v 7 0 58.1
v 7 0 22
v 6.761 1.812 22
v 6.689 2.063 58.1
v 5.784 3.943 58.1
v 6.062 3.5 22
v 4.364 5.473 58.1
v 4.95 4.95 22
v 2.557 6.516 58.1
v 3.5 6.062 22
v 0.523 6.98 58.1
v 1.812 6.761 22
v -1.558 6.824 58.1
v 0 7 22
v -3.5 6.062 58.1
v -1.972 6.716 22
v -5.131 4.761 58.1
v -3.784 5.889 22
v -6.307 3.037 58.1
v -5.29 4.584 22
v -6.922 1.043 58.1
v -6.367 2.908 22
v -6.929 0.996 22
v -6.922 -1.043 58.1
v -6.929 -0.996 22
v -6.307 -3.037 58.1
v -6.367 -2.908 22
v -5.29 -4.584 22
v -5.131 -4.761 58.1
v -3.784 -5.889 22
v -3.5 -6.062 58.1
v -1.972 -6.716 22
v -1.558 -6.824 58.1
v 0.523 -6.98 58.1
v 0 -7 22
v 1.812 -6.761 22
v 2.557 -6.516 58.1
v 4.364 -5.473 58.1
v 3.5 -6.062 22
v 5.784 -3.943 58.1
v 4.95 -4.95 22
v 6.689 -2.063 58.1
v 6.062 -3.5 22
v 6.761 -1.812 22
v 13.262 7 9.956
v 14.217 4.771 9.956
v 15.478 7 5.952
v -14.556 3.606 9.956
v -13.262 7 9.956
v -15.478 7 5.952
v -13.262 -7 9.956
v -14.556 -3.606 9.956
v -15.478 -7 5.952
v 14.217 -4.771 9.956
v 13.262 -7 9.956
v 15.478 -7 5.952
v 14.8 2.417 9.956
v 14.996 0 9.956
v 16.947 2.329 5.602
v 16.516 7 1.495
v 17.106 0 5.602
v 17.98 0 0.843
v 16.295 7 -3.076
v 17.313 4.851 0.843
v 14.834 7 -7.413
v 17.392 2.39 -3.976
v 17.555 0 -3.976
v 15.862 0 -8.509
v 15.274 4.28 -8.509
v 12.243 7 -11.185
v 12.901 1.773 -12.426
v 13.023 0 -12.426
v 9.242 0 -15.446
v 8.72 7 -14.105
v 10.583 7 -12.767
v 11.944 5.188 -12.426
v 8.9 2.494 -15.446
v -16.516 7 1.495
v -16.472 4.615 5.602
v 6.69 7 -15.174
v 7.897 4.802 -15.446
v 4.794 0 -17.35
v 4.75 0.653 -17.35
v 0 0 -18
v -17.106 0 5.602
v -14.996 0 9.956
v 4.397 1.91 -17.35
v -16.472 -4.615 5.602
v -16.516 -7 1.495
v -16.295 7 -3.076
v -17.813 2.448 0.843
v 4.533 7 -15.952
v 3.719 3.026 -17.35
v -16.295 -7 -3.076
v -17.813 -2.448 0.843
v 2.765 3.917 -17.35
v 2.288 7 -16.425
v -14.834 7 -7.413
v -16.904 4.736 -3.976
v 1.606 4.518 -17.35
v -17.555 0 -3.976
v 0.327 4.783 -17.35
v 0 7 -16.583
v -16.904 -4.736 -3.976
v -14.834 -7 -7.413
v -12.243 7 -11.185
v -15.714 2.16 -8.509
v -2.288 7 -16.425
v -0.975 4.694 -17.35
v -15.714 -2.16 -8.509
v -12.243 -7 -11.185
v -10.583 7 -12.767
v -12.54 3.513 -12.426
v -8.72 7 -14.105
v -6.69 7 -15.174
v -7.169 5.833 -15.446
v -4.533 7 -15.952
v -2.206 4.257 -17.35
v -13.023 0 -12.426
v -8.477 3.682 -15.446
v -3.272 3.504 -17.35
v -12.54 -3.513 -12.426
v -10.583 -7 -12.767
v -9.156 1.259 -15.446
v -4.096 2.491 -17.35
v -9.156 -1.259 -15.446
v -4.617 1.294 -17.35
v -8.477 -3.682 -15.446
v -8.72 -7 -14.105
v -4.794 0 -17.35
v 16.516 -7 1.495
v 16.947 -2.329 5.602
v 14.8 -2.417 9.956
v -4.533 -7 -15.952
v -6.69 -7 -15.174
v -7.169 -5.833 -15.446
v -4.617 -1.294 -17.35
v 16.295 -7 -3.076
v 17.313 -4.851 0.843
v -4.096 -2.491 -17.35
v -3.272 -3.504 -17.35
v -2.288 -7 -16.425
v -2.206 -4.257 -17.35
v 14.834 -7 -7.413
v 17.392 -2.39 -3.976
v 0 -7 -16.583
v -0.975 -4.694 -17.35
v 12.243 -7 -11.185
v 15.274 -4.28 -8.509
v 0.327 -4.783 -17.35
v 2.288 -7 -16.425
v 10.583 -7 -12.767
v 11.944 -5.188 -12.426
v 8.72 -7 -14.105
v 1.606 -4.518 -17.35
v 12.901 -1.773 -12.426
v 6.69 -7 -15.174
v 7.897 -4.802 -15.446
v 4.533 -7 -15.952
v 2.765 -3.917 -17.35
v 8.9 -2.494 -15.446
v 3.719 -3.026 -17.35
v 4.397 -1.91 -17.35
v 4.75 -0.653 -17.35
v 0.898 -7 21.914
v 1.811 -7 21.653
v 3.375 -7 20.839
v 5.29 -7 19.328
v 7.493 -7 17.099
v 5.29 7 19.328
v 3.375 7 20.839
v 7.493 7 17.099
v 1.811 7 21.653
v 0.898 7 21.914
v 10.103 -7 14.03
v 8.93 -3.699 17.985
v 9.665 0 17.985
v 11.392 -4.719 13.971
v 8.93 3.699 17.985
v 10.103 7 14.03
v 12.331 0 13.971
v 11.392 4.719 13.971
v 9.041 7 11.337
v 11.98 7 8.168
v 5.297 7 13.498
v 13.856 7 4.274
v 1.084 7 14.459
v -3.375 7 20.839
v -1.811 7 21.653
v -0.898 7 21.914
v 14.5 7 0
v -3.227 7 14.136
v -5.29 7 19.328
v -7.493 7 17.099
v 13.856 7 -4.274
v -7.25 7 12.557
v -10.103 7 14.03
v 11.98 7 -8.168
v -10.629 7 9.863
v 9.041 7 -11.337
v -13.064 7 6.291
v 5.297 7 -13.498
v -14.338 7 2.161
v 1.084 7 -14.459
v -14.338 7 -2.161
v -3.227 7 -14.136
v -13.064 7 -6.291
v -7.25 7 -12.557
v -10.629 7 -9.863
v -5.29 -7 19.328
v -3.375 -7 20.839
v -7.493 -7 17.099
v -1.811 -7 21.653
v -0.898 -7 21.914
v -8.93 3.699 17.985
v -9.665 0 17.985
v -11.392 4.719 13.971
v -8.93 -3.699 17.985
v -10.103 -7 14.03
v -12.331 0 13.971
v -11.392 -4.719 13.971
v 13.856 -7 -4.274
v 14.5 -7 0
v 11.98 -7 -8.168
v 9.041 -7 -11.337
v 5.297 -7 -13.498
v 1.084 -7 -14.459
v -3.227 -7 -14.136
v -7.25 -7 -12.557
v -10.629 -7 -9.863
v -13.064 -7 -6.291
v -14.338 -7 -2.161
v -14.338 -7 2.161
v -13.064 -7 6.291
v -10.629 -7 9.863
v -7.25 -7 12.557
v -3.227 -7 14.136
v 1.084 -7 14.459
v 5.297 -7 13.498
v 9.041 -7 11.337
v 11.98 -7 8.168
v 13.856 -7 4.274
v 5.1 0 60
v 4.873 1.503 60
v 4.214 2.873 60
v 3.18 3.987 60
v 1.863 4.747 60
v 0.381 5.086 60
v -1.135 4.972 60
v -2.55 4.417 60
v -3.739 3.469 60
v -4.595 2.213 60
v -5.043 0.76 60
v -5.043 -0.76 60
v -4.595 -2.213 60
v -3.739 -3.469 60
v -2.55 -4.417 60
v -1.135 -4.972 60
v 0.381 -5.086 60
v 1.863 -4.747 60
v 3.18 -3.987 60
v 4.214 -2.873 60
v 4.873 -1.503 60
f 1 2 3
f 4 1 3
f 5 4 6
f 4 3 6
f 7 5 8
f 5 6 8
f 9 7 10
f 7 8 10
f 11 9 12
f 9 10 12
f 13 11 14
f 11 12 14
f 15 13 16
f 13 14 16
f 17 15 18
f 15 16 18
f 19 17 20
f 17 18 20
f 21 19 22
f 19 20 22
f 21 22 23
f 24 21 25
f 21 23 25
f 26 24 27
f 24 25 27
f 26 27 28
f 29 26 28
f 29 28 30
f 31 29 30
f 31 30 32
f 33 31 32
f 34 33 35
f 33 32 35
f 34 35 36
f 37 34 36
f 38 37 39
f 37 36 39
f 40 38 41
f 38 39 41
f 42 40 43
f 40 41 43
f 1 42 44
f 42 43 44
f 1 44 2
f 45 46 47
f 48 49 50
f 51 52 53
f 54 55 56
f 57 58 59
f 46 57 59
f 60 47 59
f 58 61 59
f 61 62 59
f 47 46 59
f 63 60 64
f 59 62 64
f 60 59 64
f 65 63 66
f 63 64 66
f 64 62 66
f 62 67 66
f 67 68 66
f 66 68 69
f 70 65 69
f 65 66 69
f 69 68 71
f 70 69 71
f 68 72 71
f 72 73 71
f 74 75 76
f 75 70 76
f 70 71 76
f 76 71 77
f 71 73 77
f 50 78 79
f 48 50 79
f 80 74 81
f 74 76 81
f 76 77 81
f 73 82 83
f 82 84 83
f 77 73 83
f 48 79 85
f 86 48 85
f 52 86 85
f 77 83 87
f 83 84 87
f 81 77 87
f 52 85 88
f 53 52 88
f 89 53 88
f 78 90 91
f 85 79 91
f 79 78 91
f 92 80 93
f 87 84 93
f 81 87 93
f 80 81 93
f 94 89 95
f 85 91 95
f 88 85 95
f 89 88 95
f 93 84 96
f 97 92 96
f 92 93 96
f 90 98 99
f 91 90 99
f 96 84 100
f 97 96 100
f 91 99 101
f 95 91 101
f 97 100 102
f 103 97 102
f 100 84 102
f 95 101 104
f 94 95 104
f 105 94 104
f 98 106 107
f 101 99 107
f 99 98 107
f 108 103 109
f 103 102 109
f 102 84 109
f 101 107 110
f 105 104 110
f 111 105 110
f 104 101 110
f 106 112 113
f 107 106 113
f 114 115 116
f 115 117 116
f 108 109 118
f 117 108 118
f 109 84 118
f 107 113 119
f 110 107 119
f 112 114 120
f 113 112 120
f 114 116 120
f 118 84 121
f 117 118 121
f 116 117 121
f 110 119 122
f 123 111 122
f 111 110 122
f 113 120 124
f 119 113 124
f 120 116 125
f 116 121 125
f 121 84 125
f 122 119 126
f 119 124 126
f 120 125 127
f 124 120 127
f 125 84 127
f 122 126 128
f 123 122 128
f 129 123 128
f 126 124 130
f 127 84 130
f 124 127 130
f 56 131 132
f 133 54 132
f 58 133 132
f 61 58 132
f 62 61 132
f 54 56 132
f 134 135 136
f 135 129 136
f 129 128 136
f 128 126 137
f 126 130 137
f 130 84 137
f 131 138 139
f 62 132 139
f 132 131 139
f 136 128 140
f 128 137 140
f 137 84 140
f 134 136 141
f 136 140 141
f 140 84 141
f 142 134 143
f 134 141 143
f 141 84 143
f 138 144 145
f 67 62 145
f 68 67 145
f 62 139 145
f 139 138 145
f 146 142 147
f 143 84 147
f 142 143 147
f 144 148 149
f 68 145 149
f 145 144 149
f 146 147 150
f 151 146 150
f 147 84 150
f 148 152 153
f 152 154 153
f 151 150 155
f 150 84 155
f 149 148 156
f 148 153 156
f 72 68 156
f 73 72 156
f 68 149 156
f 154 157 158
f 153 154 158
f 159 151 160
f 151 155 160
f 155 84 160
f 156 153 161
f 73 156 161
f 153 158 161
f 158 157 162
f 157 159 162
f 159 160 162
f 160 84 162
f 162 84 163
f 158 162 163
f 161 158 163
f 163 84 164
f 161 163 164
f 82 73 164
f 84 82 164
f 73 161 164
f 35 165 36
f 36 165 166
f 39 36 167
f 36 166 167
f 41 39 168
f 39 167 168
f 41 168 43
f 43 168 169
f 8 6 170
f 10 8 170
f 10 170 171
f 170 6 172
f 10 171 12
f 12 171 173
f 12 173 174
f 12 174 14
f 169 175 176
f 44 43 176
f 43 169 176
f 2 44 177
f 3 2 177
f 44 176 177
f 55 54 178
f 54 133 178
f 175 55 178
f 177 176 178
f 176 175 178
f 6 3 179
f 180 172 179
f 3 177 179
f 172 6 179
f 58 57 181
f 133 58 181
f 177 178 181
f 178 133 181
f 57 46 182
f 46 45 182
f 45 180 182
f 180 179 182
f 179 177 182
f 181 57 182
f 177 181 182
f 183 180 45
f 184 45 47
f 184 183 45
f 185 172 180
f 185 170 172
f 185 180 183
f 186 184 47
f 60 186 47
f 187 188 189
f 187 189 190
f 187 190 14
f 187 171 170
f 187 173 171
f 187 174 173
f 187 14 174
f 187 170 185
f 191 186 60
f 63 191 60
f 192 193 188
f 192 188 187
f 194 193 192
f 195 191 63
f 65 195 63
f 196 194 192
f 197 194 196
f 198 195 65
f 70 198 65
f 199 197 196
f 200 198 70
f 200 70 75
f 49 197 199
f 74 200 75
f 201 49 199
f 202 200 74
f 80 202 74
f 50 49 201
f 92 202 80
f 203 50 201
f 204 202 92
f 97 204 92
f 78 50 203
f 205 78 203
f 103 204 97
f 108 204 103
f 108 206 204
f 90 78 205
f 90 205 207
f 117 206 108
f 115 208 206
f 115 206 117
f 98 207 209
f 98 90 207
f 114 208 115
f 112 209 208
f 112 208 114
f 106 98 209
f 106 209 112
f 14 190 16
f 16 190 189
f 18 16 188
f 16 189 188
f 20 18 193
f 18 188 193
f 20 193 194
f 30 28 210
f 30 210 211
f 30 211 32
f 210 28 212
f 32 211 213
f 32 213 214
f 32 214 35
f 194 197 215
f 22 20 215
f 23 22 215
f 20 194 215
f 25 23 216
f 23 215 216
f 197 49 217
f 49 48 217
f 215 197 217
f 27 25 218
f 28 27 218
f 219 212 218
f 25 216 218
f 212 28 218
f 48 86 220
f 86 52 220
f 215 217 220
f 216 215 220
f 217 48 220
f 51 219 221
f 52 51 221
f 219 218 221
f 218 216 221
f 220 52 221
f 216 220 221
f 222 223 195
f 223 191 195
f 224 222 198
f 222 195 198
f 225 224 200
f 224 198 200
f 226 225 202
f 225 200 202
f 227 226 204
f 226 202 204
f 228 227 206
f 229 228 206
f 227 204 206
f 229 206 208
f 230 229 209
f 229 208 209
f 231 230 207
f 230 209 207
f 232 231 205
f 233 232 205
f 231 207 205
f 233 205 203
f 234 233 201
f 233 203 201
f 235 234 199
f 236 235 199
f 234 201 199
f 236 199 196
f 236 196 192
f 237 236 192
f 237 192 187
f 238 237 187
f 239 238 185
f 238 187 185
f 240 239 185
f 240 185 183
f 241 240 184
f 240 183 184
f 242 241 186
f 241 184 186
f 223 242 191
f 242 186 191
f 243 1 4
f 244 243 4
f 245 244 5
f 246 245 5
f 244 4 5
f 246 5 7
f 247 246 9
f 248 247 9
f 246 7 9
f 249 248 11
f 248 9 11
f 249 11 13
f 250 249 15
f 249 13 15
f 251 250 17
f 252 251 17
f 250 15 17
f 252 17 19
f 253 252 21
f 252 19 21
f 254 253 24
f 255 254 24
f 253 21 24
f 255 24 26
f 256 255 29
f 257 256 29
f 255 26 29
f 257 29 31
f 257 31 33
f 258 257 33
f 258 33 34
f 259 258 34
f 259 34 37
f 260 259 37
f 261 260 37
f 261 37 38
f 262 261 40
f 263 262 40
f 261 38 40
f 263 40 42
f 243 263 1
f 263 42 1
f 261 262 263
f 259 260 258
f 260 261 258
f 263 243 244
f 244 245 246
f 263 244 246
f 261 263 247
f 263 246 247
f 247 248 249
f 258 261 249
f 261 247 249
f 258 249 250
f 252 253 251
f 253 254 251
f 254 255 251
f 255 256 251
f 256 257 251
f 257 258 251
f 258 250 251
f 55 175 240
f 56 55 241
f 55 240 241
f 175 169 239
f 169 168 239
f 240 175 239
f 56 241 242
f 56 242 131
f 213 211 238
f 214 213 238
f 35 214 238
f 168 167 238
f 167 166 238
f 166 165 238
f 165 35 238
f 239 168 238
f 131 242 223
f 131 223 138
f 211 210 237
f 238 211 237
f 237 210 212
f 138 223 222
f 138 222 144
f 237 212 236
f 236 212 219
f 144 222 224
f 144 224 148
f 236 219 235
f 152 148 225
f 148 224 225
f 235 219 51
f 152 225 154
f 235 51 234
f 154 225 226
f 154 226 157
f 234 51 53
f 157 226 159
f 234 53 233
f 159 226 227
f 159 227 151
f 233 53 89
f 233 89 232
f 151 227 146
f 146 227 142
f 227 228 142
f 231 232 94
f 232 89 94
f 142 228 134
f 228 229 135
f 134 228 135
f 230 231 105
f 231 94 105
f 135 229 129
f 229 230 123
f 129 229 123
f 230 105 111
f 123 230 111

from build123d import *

# Parameters (mm, degrees)
SZKIC1_W                        = 7
SZKIC1_H                        = 38
WYTNIJ_WYCI_GNI_CIE1_DEPTH      = 19
WYTNIJ_WYCI_GNI_CIE1_DEPTH_BACK = 19
SZKIC3_R                        = 14.5
WYTNIJ_WYCI_GNI_CIE2_DEPTH      = 8
WYTNIJ_WYCI_GNI_CIE2_DEPTH_BACK = 8
SFAZOWANIE1_SIZE                = 1.9


with BuildPart() as part:
    # Szkic1 → Obrót1 (revolve)
    with BuildSketch(Plane(origin=(0, 0, 0), x_dir=(1, 0, 0), z_dir=(0, 1, 0))):
        with BuildLine():
            Line((0, 18), (0, -22))
            Line((0, -22), (7, -22))
            Line((7, -22), (14.996070523, -9.955795743))
            ThreePointArc((14.996070523, -9.955795743), (15.861972188, 8.508691927), (0, 18))
        make_face()
        with Locations((3.5, -41)):
            Rectangle(SZKIC1_W, SZKIC1_H)
    revolve(axis=Axis((0, 0, -26.043516498), (0, 0, 1)))

    # Szkic2 → Wytnij-wyciągnięcie1 (cut, two sides)
    with BuildSketch(Plane(origin=(0, 0, 0), x_dir=(0, 0, -1), z_dir=(1, 0, 0))) as wytnij_wyci_gni_cie1_sk:
        with BuildLine():
            Line((-22, 7), (16.583123952, 7))
            ThreePointArc((16.583123952, 7), (5.192750307, 17.23471335), (-9.955795743, 14.996070523))
            Line((-9.955795743, 14.996070523), (-22, 7))
        make_face()
        with BuildLine():
            Line((-22, -7), (16.583123952, -7))
            ThreePointArc((16.583123952, -7), (5.192750307, -17.23471335), (-9.955795743, -14.996070523))
            Line((-9.955795743, -14.996070523), (-22, -7))
        make_face()
    extrude(amount=WYTNIJ_WYCI_GNI_CIE1_DEPTH, mode=Mode.SUBTRACT)
    extrude(wytnij_wyci_gni_cie1_sk.sketch, amount=-WYTNIJ_WYCI_GNI_CIE1_DEPTH_BACK, mode=Mode.SUBTRACT)

    # Szkic3 → Wytnij-wyciągnięcie2 (cut, two sides)
    with BuildSketch(Plane(origin=(0, 0, 0), x_dir=(1, 0, 0), z_dir=(0, 1, 0))) as wytnij_wyci_gni_cie2_sk:
        Circle(SZKIC3_R)
    extrude(amount=WYTNIJ_WYCI_GNI_CIE2_DEPTH, mode=Mode.SUBTRACT)
    extrude(wytnij_wyci_gni_cie2_sk.sketch, amount=-WYTNIJ_WYCI_GNI_CIE2_DEPTH_BACK, mode=Mode.SUBTRACT)

    # Sfazowanie1
    sfazowanie1_edges = [part.edges().sort_by_distance(p)[0] for p in [
        (-7, 0, 60),
    ]]
    chamfer(sfazowanie1_edges, length=SFAZOWANIE1_SIZE)


solid = part.part
